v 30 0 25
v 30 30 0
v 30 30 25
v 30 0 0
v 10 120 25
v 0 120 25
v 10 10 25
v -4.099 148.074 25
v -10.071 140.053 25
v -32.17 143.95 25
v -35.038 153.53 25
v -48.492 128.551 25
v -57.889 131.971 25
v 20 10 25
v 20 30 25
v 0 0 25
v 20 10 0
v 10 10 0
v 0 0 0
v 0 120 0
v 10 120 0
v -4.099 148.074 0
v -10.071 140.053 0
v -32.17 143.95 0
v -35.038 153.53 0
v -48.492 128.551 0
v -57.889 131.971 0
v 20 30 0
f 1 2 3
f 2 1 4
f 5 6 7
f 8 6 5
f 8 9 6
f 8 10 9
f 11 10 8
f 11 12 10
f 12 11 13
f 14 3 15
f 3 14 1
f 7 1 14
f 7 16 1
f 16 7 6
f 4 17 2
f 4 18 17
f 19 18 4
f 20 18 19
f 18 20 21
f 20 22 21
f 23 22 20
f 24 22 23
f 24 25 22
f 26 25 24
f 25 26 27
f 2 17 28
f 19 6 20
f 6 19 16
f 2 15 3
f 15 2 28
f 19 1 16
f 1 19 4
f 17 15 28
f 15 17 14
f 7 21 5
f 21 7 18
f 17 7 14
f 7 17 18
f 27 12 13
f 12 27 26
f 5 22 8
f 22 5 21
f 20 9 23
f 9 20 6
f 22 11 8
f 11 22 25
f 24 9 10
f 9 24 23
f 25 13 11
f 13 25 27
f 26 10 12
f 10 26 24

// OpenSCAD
//width of hook
wth=25;
//thickness of material
thk=10;
//Ledge size
ldg=10;
//length
length=150;
//hook inside radius
r=20;
//angle of hook (default 160)
a=160;
//poly (decrease to less than 15 for more square look)
$fn=8;

module length(){
difference(){    
cube([ldg+thk*2,ldg+thk*2,wth]);
translate([thk,thk,0])cube([ldg,ldg*2,wth]); 
}   
cube([thk,length-r-thk,wth]);
}
module hook(){
    translate([-r-thk/2,length-r-thk,0])rotate (a=0, v=[2,0,0]) {
    translate([0,0,0]) rotate_extrude(angle = a, convexity=10)
    translate([r+thk/2,0,0]) square([thk,wth]);
    }}
    
length();
hook();
